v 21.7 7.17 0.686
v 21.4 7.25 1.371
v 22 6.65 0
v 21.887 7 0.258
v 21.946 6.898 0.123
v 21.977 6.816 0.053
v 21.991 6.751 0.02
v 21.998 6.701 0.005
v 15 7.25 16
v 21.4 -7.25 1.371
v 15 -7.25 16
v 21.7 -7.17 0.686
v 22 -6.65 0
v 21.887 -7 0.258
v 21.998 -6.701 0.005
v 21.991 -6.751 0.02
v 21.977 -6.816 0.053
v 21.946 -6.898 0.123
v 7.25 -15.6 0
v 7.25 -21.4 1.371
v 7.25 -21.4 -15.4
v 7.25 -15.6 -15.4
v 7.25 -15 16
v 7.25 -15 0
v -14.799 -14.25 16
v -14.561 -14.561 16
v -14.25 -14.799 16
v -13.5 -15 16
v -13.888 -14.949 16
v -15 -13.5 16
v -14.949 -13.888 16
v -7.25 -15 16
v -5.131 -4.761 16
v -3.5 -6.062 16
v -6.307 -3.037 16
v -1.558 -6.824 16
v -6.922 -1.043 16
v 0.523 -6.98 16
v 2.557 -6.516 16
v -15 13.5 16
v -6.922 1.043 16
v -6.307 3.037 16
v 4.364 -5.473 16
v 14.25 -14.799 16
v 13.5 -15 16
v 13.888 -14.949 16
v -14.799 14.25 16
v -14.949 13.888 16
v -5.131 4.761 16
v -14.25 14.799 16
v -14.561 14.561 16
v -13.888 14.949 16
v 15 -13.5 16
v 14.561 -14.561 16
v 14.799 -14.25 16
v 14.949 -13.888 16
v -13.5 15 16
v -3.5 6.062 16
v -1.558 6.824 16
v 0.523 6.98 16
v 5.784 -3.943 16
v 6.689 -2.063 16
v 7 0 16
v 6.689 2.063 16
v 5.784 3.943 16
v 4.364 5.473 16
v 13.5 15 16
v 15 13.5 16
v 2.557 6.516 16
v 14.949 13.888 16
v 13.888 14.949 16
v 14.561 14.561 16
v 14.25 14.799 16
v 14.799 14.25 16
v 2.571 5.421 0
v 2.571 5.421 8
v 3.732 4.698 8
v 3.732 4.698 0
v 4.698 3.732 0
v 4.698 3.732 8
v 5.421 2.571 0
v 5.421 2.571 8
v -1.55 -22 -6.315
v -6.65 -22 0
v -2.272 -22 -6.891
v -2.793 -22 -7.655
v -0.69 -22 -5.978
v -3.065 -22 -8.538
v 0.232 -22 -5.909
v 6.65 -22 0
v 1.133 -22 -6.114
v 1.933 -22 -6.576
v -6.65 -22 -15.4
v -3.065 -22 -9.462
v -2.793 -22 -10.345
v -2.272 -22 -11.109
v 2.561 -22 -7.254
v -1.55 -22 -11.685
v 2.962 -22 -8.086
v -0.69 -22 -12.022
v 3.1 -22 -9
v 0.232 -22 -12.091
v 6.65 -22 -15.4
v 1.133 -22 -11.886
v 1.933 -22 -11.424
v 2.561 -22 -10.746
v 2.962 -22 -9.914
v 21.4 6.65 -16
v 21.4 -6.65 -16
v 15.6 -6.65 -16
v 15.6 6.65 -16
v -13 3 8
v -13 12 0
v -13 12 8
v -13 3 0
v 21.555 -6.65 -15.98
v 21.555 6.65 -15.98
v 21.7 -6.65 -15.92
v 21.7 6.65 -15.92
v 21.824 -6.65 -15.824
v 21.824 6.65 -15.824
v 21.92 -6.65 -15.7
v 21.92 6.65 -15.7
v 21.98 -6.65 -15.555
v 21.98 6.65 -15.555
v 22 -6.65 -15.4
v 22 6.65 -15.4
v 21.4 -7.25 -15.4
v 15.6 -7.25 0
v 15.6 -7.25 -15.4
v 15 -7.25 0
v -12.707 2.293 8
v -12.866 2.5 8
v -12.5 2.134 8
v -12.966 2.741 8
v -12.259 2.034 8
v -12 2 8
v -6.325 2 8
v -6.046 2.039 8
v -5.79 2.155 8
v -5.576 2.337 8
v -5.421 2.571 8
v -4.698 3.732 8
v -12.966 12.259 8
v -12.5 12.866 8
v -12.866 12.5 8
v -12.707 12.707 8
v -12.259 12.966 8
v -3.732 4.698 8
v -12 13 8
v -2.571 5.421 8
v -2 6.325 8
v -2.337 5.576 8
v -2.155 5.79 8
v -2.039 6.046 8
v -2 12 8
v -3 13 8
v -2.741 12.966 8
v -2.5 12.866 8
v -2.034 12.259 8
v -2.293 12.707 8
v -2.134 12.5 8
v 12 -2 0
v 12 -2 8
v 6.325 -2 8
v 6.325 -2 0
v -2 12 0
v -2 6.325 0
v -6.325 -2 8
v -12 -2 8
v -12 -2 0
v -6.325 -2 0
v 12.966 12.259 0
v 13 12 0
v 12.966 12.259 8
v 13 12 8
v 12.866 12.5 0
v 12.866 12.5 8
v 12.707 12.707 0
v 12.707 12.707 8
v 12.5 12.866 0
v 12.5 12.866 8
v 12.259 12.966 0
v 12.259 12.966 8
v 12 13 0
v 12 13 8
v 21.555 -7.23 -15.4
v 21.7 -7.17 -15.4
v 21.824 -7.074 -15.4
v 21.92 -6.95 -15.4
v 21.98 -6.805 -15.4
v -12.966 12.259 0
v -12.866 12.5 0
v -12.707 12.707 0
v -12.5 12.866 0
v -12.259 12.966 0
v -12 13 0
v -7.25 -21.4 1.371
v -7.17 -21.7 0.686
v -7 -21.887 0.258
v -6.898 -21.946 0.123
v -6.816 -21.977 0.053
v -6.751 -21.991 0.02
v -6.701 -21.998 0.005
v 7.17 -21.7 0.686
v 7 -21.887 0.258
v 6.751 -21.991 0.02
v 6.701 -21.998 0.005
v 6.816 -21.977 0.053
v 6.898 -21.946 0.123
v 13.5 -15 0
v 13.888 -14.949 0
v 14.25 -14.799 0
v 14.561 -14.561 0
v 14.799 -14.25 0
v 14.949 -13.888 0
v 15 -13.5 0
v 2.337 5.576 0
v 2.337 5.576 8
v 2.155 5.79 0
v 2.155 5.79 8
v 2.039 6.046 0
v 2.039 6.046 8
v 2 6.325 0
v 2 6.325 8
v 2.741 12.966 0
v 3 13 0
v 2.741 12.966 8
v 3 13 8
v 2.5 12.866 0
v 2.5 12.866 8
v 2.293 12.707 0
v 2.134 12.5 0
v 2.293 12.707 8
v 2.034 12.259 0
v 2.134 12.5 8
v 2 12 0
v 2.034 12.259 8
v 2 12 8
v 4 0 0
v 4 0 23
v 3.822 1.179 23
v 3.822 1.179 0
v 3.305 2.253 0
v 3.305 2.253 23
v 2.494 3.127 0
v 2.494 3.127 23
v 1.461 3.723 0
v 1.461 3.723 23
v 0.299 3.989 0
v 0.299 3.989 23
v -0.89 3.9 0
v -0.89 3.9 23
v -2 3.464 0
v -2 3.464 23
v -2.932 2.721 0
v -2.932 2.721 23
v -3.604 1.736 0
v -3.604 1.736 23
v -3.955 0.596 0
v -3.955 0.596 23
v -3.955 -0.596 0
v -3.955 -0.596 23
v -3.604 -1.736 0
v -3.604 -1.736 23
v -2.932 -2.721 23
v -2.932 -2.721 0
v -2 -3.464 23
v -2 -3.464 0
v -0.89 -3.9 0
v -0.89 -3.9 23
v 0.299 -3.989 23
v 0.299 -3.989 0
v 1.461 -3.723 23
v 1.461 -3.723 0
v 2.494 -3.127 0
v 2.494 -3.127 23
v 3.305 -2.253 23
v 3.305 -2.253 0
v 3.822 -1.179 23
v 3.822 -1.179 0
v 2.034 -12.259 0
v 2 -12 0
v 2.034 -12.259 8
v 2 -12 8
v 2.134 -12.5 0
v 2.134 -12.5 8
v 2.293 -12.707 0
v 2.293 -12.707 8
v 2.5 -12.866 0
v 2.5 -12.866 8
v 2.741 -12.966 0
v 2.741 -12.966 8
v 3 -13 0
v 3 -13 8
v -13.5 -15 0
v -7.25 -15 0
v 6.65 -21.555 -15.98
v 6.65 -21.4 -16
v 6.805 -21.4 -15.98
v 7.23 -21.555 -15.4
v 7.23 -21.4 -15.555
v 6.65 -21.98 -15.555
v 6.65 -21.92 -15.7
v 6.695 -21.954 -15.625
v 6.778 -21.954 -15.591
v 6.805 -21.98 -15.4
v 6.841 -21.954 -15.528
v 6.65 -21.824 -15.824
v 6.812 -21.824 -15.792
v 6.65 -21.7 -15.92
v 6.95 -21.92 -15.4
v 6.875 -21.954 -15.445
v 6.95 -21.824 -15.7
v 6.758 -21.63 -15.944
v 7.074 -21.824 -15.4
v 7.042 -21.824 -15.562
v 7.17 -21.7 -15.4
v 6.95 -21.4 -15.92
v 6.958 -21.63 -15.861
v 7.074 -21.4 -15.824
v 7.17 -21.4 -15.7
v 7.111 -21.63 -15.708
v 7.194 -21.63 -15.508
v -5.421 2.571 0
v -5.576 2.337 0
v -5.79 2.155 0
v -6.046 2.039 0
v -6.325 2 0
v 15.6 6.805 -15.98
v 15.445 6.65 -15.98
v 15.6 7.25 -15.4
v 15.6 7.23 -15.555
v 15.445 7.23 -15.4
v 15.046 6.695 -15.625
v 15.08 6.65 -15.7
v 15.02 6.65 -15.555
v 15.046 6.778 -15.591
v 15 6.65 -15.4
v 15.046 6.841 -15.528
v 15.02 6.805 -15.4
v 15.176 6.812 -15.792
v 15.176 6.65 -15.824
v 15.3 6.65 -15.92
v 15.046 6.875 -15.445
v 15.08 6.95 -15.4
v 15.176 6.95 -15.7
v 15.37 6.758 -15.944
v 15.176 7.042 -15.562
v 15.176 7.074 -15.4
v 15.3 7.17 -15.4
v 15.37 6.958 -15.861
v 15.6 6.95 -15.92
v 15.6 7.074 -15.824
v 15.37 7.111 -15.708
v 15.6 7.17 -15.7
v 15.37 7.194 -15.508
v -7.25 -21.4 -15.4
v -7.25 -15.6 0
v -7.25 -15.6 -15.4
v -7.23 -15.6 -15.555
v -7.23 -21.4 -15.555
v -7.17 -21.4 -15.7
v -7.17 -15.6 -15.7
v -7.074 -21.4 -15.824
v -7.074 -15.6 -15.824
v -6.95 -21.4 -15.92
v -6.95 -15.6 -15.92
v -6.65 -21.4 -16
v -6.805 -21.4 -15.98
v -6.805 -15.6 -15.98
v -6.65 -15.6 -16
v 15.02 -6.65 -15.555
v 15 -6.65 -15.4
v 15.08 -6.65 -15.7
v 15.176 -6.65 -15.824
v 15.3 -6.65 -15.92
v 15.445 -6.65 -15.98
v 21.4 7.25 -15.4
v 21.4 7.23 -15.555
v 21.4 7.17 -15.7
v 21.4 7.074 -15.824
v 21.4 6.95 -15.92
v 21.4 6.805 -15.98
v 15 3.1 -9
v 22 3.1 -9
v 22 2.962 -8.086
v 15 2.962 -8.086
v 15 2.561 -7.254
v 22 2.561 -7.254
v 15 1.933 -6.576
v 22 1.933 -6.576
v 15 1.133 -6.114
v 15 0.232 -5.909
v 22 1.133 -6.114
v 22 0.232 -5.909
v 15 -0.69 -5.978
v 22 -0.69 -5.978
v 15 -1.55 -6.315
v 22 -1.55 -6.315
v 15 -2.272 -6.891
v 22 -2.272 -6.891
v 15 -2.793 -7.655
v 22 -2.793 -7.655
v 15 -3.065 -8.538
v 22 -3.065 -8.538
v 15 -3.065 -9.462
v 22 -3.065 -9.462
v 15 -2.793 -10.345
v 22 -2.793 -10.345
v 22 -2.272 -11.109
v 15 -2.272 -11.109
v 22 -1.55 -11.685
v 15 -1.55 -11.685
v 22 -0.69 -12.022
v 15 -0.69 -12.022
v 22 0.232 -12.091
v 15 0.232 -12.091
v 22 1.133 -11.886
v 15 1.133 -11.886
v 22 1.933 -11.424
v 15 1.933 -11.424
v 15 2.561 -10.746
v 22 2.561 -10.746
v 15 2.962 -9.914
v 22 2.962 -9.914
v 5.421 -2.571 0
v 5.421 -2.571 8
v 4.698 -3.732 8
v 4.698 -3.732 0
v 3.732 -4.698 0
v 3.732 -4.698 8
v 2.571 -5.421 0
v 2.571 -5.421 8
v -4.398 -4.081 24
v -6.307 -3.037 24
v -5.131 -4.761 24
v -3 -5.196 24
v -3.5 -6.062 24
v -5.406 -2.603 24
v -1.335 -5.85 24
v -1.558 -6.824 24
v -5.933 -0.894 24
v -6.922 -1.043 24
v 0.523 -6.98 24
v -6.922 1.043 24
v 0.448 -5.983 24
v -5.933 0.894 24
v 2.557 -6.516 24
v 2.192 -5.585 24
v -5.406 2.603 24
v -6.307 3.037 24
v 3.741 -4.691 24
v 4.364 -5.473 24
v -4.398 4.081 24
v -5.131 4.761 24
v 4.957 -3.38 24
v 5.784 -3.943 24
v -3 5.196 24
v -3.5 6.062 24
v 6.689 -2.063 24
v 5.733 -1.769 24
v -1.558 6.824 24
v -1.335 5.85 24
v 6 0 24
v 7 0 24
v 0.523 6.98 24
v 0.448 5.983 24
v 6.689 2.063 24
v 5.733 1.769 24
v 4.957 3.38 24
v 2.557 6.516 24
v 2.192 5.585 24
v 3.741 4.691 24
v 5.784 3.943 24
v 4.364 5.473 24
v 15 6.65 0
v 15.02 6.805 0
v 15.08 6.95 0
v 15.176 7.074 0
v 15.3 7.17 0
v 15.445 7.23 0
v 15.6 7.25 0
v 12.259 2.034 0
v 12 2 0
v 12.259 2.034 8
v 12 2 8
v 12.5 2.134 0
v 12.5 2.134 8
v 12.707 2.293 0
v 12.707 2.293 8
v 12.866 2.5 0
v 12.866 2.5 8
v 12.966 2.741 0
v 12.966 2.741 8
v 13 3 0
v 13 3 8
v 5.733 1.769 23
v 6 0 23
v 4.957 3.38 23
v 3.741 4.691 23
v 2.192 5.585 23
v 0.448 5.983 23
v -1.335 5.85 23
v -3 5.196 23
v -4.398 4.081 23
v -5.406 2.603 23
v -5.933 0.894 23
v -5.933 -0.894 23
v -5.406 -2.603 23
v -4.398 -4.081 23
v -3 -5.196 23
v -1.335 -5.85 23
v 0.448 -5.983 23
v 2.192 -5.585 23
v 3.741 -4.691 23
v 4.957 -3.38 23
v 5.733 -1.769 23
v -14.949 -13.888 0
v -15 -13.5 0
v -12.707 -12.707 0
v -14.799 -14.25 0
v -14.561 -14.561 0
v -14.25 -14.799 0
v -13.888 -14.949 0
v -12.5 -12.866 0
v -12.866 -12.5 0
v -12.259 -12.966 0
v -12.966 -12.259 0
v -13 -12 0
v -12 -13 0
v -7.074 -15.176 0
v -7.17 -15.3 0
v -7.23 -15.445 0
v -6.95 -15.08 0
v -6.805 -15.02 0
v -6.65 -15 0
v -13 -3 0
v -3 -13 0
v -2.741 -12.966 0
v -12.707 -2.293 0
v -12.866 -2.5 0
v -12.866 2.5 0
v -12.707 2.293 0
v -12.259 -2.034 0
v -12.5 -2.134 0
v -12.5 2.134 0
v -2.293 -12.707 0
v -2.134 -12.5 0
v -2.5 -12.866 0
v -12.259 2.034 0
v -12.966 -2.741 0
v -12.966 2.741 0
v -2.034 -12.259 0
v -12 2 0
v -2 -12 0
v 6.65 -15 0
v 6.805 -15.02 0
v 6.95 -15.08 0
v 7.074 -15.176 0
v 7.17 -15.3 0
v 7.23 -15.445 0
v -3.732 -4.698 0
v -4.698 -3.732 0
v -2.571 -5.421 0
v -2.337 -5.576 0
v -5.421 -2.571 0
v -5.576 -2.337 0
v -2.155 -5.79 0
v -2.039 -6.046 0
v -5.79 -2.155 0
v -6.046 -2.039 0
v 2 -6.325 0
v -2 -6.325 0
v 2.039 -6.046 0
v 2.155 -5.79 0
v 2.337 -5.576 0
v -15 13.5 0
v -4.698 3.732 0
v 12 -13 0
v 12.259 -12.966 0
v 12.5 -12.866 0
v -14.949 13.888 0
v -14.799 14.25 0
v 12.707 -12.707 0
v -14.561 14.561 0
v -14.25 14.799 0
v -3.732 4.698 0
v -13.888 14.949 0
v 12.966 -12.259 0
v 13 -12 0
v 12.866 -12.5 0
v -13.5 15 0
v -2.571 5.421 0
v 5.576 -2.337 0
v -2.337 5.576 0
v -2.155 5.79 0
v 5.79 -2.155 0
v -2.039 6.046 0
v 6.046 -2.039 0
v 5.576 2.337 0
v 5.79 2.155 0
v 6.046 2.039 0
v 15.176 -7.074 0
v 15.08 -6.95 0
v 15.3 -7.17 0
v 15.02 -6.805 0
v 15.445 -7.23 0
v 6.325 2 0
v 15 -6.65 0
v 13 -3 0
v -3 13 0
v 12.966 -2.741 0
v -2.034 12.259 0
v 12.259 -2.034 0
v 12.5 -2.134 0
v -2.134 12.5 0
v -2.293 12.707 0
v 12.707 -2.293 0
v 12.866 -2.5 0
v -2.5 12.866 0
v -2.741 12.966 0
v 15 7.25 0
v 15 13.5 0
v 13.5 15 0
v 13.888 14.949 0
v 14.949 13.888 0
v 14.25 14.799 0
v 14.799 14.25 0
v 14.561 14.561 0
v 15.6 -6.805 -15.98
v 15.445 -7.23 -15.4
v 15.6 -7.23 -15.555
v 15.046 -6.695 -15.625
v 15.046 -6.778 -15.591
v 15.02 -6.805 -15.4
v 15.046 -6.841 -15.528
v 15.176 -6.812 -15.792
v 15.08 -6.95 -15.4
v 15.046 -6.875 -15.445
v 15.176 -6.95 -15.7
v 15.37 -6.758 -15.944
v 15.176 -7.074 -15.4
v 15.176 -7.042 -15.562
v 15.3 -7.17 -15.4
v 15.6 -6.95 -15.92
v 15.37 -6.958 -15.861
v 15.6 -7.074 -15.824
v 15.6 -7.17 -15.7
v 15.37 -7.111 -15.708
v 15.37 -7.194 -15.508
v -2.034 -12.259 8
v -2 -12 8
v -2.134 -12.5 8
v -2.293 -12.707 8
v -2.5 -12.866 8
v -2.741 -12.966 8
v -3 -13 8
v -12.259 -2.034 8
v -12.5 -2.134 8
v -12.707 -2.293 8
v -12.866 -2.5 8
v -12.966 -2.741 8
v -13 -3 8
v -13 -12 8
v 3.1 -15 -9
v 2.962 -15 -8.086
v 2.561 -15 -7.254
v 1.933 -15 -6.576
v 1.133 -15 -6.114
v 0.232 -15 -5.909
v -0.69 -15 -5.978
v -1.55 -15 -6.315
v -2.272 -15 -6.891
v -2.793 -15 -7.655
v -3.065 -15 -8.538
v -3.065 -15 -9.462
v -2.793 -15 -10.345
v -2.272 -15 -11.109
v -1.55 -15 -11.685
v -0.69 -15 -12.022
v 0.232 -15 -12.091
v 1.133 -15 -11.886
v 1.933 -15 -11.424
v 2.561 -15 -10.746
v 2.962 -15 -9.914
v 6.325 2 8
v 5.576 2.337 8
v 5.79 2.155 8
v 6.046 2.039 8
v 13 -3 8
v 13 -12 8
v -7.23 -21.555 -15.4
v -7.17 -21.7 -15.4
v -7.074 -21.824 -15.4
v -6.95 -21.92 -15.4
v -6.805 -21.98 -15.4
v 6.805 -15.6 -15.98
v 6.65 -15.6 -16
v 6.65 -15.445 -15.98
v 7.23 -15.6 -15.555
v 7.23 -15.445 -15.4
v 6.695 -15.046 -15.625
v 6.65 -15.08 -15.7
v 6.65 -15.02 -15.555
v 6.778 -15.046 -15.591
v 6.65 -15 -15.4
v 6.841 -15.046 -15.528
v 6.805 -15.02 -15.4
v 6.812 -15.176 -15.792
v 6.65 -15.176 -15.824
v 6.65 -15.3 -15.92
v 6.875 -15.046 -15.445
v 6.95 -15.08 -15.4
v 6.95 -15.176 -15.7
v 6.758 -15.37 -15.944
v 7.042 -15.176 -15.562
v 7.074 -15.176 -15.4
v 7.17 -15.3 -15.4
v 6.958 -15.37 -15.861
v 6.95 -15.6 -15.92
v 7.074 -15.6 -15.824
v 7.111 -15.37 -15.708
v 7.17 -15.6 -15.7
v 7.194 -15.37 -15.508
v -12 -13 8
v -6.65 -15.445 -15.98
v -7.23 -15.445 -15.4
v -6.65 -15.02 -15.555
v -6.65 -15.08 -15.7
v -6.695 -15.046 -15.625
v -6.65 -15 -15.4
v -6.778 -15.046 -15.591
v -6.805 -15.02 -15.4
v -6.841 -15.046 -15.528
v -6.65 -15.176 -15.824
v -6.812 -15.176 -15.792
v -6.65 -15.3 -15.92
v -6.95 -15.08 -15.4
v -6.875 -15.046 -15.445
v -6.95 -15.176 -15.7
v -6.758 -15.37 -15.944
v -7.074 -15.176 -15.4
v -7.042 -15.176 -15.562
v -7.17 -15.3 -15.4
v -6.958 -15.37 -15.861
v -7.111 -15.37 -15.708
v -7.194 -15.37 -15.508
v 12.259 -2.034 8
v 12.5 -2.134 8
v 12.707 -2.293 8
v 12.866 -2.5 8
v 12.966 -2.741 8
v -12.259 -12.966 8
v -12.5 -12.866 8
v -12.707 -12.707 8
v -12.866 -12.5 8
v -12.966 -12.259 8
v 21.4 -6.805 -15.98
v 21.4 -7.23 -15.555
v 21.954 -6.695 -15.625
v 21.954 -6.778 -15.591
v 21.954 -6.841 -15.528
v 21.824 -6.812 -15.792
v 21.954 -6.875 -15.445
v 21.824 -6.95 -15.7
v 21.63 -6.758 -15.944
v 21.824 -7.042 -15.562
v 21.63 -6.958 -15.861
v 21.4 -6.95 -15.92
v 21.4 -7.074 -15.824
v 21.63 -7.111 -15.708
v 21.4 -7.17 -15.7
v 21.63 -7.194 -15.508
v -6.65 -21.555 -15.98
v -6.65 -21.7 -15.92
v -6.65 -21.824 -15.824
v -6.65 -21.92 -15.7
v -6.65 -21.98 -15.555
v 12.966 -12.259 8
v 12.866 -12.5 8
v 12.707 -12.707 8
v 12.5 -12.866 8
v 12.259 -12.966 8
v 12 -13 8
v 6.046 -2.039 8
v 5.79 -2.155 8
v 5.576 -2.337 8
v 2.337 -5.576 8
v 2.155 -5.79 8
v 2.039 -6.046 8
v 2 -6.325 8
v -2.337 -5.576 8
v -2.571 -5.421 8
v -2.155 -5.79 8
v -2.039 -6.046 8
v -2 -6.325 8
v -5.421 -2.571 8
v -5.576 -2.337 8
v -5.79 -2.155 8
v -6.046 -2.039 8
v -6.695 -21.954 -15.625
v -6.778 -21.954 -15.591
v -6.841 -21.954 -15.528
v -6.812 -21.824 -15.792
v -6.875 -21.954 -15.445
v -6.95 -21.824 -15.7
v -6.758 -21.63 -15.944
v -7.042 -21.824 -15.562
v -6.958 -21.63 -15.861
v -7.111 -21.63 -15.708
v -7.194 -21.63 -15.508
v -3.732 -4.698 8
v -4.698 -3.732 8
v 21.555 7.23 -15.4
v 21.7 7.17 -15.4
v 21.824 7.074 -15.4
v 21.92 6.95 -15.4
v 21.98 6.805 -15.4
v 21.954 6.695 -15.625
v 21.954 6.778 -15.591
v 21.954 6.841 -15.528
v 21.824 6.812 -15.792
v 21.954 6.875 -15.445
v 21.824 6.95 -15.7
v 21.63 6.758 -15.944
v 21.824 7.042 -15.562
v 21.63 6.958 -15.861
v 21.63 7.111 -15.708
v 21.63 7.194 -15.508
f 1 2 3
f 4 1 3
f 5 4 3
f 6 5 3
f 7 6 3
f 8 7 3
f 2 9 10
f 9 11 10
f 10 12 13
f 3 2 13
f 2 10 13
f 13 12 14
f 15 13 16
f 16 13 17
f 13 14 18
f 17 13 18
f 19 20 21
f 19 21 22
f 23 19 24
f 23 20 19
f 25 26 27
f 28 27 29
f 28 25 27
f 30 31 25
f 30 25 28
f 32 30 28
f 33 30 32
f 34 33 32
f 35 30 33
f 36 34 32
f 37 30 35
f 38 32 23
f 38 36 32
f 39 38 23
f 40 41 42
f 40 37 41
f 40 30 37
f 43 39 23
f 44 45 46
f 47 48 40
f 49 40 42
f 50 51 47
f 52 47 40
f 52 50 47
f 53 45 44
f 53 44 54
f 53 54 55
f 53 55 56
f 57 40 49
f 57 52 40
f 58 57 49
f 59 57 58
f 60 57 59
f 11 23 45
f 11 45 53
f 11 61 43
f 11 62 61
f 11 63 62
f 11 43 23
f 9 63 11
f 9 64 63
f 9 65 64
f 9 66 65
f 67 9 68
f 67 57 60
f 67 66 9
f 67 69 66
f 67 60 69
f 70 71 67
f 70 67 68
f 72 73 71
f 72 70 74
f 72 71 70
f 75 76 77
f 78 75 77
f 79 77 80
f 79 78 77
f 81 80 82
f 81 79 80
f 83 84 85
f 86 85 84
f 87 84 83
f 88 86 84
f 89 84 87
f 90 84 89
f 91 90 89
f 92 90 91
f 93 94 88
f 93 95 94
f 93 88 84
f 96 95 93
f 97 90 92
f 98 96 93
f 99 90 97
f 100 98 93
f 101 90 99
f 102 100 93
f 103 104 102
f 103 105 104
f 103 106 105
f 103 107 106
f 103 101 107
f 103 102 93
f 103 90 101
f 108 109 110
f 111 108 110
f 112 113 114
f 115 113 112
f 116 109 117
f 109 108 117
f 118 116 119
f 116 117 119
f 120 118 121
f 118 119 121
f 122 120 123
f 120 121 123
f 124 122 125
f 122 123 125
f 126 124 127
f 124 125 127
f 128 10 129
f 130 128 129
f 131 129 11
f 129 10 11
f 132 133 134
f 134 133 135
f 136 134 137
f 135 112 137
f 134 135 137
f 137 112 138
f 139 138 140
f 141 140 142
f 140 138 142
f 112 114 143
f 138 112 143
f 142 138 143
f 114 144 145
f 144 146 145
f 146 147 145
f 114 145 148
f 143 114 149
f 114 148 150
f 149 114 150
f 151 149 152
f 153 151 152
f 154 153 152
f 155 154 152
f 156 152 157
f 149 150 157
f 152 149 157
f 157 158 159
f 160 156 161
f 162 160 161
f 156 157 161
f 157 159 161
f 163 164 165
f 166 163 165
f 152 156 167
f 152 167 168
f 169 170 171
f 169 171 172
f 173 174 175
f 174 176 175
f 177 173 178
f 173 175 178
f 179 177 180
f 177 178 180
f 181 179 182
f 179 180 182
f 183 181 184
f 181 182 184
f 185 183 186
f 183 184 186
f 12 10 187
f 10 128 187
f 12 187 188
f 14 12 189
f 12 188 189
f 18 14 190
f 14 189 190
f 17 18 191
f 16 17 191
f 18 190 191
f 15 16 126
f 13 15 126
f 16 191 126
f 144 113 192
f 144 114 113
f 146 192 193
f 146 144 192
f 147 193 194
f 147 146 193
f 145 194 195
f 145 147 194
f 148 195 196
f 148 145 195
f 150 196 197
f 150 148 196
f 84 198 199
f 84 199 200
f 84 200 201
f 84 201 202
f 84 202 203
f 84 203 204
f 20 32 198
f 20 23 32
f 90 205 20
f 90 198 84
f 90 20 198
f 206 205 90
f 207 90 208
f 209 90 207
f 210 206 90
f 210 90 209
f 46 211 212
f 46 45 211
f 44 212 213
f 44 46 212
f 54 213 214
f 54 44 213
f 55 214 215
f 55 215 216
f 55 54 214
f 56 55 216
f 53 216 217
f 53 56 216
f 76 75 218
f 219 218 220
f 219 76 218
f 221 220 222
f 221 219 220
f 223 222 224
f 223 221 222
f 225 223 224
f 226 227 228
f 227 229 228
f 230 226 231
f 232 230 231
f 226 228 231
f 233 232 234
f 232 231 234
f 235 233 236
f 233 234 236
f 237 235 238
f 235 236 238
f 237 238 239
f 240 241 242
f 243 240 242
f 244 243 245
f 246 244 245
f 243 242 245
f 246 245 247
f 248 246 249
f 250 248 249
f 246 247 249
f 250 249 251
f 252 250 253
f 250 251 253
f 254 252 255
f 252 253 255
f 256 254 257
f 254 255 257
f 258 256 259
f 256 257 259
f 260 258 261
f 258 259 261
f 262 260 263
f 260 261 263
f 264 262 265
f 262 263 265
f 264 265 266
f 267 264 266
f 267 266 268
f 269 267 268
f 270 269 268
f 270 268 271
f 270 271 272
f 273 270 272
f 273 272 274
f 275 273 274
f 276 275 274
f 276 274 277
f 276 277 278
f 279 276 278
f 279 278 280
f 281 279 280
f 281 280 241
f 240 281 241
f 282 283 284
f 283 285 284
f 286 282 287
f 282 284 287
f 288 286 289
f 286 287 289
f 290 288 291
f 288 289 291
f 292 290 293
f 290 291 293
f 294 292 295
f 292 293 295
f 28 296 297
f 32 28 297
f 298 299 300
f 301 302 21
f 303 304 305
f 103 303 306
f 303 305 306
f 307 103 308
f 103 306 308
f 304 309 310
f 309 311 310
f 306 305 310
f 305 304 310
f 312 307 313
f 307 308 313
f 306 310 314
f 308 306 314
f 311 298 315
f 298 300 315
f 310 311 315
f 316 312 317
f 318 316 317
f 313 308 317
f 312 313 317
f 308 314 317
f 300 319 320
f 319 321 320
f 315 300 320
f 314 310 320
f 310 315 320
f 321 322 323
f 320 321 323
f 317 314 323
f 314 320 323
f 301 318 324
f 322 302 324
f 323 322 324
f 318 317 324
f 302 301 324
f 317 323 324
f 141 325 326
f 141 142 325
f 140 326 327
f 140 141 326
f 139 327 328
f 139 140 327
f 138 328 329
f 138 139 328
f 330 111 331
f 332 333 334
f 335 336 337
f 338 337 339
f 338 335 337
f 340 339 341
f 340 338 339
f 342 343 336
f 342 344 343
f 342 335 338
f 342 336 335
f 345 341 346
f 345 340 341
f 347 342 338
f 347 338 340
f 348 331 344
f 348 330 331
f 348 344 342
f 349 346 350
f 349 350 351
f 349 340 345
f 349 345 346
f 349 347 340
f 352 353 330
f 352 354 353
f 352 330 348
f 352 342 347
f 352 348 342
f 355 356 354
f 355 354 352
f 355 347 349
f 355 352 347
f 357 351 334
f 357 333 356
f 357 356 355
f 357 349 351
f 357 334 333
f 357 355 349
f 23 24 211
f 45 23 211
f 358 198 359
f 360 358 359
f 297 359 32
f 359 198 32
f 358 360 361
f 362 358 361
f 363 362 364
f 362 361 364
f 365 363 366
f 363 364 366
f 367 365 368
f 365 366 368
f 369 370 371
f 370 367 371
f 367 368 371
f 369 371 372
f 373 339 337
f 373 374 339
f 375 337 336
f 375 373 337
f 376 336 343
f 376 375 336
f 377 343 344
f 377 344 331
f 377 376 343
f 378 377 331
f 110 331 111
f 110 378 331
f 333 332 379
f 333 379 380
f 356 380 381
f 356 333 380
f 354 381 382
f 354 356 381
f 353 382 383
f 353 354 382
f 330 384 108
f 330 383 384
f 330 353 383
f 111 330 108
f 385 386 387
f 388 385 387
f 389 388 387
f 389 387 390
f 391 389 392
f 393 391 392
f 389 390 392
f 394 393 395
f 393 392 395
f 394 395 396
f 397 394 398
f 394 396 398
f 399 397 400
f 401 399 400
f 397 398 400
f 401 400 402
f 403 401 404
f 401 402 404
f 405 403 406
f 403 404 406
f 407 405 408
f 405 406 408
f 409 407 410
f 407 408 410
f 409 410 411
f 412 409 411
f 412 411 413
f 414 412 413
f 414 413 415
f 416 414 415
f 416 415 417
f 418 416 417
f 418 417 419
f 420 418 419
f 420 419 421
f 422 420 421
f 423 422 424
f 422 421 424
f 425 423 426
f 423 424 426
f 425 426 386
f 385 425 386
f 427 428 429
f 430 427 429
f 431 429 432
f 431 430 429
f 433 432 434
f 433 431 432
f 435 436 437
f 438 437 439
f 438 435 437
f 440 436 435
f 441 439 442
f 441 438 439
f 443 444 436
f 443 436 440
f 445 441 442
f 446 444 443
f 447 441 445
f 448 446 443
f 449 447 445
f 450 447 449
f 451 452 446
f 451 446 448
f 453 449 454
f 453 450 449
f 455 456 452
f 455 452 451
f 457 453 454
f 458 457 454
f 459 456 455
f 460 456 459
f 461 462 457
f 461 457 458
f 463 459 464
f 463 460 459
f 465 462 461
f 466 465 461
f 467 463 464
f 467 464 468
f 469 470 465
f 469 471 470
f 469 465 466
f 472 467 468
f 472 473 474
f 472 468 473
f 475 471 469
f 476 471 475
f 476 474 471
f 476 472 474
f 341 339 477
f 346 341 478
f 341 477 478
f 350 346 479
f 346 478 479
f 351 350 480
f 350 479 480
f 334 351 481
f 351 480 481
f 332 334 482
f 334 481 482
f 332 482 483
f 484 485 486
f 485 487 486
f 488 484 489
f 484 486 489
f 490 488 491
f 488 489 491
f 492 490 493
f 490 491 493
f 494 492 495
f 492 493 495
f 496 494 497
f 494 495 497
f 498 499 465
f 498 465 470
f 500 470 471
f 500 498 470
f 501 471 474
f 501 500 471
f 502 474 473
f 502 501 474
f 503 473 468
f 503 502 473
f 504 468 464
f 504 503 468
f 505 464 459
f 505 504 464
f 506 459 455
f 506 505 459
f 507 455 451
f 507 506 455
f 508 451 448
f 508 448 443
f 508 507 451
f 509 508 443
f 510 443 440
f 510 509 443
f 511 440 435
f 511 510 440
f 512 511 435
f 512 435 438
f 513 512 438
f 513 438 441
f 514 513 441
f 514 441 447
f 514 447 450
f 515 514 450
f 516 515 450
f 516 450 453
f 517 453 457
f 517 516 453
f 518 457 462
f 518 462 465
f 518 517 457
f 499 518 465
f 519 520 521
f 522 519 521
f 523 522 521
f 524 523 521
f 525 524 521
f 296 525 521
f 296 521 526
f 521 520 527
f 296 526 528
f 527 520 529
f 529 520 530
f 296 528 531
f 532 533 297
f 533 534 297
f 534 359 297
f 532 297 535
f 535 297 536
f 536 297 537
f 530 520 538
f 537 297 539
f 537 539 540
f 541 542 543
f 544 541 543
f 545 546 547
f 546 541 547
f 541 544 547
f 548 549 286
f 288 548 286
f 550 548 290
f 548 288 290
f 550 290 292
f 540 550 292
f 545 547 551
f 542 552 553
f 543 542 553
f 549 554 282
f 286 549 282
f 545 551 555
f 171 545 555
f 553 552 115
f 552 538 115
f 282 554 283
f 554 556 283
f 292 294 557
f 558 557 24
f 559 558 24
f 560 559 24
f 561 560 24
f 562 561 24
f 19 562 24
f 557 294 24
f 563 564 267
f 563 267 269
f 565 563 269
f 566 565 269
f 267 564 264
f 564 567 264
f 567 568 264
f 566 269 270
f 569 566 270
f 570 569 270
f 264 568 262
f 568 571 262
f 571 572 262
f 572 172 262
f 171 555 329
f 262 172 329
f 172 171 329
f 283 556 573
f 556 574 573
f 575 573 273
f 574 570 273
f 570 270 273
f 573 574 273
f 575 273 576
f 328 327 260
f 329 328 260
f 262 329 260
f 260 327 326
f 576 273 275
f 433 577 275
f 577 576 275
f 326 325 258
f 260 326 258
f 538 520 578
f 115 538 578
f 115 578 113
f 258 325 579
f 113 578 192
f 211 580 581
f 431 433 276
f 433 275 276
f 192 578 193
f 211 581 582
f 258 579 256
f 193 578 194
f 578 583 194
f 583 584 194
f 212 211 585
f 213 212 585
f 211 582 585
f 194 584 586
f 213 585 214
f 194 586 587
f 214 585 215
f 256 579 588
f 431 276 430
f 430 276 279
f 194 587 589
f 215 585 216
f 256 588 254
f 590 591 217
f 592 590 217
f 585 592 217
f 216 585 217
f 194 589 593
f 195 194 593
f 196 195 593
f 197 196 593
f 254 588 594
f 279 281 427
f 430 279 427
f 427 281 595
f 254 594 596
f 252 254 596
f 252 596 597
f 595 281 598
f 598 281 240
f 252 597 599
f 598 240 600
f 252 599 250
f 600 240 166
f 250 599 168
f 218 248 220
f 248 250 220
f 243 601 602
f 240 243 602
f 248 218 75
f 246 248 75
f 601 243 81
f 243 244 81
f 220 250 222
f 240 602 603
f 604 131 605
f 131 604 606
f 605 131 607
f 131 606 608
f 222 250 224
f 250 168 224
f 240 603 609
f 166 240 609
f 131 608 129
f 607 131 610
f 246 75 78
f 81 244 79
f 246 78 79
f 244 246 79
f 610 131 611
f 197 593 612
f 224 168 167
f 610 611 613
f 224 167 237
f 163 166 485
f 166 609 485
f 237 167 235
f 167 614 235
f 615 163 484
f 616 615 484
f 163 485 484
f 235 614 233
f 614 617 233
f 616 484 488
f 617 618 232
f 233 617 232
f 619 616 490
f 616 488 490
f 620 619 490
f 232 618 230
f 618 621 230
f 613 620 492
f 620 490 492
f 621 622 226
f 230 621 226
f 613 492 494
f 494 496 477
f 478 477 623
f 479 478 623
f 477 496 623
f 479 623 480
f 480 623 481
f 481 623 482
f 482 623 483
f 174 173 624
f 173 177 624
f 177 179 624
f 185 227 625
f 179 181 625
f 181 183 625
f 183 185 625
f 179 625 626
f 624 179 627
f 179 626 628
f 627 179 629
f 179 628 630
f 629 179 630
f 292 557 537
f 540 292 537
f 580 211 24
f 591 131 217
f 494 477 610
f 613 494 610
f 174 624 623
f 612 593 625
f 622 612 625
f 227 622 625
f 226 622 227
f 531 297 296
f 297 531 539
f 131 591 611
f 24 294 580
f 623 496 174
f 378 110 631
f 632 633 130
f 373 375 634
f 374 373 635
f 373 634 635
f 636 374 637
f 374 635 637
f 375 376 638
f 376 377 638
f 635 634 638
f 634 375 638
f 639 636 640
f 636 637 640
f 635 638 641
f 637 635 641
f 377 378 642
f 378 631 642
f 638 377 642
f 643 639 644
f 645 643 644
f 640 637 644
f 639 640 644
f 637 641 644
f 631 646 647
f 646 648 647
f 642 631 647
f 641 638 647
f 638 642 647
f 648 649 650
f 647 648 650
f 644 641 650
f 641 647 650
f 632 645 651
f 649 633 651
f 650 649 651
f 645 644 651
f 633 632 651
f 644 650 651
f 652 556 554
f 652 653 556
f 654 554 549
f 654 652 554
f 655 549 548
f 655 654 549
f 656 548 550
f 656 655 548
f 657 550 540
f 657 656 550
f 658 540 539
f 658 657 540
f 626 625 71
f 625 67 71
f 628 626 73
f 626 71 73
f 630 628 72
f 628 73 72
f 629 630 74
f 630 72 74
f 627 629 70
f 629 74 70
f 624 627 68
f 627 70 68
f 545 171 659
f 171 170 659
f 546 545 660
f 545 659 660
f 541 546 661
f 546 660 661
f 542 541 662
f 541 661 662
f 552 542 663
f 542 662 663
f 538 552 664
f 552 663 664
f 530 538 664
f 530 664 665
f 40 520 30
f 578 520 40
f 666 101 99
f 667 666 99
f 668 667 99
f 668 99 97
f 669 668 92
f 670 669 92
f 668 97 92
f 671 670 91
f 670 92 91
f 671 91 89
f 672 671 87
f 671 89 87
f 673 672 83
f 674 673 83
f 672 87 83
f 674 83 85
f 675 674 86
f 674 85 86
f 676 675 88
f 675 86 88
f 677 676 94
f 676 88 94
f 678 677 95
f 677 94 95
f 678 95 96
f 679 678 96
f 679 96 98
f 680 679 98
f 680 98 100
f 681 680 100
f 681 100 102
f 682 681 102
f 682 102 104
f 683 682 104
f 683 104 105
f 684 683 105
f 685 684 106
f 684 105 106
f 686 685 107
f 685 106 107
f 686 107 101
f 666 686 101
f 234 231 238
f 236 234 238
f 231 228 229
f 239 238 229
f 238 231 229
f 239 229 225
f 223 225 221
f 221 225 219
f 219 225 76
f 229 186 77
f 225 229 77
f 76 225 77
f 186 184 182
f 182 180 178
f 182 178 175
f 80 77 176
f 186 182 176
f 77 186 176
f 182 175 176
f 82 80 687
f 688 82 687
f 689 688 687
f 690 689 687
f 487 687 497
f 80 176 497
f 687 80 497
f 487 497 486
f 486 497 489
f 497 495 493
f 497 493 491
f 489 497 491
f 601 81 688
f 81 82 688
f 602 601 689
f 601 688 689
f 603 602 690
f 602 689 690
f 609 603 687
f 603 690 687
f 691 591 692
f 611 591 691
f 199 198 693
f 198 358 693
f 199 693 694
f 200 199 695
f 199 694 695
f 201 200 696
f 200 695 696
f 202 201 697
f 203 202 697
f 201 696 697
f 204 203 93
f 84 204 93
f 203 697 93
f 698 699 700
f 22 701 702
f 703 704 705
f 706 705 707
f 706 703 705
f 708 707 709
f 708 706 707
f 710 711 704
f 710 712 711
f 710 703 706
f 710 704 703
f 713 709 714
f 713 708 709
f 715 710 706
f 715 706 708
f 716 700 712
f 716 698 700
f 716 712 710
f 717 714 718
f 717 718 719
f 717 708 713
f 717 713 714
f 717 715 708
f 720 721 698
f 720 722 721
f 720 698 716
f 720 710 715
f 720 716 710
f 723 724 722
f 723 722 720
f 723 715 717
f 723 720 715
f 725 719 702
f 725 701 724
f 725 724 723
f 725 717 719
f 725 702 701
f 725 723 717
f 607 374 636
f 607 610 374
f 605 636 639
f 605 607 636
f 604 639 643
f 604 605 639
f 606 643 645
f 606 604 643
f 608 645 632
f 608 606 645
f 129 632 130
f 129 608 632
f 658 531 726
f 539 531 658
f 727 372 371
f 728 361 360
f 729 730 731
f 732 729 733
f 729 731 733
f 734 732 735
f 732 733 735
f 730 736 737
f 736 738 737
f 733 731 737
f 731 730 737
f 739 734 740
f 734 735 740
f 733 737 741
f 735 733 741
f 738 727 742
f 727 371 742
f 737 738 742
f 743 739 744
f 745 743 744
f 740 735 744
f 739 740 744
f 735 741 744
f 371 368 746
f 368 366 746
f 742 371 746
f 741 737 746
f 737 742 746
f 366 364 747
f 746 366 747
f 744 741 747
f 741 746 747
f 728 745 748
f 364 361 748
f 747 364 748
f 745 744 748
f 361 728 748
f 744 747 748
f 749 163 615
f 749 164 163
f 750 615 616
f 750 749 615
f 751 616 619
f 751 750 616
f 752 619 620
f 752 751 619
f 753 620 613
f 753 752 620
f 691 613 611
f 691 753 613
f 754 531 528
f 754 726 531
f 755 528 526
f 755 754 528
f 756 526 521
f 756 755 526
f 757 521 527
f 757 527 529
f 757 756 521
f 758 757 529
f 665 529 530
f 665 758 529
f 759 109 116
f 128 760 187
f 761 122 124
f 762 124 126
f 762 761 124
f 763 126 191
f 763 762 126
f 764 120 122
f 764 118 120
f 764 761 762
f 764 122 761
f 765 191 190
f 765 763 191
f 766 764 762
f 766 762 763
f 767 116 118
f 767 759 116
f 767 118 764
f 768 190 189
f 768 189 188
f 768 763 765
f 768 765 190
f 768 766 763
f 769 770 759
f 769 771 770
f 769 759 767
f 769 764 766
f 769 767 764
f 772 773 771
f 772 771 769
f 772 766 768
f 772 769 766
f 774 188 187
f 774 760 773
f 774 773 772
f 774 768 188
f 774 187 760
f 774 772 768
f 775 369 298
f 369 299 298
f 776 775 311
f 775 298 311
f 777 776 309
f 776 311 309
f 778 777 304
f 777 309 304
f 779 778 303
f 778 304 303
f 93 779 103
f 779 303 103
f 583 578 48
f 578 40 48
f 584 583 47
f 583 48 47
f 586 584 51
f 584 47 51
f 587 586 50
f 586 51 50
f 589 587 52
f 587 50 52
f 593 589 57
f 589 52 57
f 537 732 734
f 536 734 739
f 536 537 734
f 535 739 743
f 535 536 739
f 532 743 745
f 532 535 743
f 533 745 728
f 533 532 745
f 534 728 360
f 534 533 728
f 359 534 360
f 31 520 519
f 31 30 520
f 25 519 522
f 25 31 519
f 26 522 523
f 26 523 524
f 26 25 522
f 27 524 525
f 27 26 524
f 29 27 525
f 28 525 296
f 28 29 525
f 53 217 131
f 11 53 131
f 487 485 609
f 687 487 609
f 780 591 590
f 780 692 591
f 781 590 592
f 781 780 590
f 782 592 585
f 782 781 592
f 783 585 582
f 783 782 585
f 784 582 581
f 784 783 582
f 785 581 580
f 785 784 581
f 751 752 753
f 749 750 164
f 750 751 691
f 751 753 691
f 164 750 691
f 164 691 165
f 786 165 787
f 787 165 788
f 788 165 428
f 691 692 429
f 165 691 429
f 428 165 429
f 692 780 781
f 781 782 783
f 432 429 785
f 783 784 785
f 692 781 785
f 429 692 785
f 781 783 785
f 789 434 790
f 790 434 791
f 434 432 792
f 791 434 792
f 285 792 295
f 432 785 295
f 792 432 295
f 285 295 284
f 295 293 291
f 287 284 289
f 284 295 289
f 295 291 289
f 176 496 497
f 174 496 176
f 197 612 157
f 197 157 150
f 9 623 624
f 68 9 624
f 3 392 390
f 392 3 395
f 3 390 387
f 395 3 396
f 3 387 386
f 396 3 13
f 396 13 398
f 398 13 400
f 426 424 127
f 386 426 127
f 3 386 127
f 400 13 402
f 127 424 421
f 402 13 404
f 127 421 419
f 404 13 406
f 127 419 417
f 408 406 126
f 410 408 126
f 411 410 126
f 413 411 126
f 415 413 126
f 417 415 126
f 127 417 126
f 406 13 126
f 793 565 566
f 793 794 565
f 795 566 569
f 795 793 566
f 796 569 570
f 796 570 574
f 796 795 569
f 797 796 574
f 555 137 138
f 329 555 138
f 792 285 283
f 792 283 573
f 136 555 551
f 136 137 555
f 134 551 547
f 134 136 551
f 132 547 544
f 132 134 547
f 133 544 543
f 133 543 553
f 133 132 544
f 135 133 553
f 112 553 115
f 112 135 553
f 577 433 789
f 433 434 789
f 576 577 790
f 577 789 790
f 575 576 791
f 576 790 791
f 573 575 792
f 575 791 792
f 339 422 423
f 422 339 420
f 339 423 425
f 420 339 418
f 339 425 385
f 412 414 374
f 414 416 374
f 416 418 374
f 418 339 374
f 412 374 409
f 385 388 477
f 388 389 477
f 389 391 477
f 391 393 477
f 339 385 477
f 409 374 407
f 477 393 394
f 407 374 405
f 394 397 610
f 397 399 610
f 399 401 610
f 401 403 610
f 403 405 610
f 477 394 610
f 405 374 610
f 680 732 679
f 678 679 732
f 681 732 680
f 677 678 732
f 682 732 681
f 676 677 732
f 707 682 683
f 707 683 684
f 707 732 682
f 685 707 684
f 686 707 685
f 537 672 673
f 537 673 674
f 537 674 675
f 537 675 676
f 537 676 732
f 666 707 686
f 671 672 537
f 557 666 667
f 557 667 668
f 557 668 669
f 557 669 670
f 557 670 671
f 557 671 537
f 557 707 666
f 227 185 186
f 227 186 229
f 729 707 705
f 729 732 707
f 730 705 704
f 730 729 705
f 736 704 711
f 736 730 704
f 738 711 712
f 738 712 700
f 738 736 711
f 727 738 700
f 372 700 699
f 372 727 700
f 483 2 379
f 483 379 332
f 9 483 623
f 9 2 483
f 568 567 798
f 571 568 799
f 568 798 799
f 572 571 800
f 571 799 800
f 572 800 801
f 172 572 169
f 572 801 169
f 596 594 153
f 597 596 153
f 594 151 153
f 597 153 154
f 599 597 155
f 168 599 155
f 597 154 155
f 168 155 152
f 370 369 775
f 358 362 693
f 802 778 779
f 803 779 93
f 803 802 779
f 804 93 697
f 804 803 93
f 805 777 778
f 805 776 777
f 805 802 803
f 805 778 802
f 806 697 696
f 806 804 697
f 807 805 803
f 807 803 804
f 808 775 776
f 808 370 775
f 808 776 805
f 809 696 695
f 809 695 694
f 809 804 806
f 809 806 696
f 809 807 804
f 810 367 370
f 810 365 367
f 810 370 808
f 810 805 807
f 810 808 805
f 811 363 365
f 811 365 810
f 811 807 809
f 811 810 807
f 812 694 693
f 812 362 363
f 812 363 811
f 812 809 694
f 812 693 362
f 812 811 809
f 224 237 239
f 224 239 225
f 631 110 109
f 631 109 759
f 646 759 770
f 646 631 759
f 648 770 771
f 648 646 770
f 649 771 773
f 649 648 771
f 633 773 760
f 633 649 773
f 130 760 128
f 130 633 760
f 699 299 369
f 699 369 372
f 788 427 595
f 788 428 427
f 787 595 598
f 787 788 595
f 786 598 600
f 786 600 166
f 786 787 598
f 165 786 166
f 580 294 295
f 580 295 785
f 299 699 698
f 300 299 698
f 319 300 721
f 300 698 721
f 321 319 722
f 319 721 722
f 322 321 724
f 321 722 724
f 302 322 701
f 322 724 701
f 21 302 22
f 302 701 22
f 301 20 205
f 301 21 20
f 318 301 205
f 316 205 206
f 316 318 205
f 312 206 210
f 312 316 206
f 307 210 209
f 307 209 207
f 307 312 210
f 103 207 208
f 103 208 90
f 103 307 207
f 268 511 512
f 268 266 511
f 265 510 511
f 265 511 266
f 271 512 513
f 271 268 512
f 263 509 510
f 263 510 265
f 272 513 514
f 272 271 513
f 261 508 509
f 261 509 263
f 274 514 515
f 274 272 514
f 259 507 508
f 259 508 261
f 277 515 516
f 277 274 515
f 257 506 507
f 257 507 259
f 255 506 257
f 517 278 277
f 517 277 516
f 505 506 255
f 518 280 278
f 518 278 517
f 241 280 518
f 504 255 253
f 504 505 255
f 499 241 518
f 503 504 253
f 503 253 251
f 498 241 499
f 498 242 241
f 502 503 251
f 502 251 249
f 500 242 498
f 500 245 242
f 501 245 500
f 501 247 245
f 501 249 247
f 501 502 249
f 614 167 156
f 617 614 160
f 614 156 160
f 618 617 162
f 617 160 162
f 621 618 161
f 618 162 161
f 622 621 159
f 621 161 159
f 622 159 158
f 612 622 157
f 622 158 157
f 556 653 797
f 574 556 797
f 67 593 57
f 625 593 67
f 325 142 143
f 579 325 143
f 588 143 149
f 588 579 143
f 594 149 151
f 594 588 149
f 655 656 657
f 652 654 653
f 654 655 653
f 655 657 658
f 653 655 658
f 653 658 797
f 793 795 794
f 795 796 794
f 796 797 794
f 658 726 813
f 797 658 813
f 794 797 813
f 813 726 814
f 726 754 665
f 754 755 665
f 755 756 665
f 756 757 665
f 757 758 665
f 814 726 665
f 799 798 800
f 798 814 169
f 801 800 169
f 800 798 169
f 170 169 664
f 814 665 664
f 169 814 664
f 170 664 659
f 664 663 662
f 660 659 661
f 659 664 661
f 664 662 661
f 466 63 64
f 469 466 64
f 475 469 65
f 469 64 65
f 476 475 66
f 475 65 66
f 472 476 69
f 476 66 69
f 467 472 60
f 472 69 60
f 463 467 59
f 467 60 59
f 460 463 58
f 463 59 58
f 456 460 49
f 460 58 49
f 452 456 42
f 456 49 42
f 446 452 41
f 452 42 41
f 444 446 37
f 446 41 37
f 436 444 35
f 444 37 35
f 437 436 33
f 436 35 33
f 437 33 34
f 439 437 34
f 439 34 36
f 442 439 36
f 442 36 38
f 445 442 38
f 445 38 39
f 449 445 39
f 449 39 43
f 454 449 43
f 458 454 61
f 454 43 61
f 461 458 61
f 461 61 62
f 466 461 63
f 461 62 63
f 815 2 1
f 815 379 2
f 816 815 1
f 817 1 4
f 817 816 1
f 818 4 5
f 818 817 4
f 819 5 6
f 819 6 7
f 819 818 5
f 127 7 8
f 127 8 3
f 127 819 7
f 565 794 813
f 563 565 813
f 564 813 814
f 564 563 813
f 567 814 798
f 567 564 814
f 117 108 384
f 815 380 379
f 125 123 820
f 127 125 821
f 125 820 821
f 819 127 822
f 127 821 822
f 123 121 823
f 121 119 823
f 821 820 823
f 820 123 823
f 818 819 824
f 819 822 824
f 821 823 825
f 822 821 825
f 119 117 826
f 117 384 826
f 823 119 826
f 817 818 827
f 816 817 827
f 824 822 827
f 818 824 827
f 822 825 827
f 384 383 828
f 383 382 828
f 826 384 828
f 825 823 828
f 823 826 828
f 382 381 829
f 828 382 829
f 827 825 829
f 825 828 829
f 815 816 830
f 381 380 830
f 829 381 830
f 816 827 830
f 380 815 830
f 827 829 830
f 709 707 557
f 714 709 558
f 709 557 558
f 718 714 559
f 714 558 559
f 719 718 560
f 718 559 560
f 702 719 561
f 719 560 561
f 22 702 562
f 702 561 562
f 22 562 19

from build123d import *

# Parameters (mm, degrees)
SKETCH_W           = 30
SKETCH_H           = 30
PAD_DEPTH          = 16
SKETCH001_R        = 7
PAD001_DEPTH       = 8
SKETCH002_R        = 4
POCKET_DEPTH       = 24
CYLINDER_R         = 6
CYLINDER_DEPTH     = 1
PAD002_DEPTH       = 7.25
SKETCH004_R        = 3.1
POCKET001_DEPTH    = 7
PAD003_DEPTH       = 7.25
SKETCH006_R        = 3.1
POCKET002_DEPTH    = 7
POCKET003_DEPTH    = 8
POLARPATTERN_COUNT = 4
FILLET_R           = 1
FILLET001_R        = 1.5
FILLET002_R        = 0.6


with BuildPart() as part:
    # Sketch → Pad (new body)
    with BuildSketch(Plane.XY):
        Rectangle(SKETCH_W, SKETCH_H)
    extrude(amount=PAD_DEPTH)

    # Sketch001 (on Face6 of Pad) → Pad001 (join)
    with BuildSketch(Plane.XY.offset(16)):
        Circle(SKETCH001_R)
    extrude(amount=PAD001_DEPTH)

    # Sketch002 (on Face8 of Pad001) → Pocket (cut)
    with BuildSketch(Plane.XY.offset(24)):
        Circle(SKETCH002_R)
    extrude(amount=-POCKET_DEPTH, mode=Mode.SUBTRACT)

    # Cylinder → Cylinder (cut)
    with BuildSketch(Plane.XY.offset(23)):
        Circle(CYLINDER_R)
    extrude(amount=CYLINDER_DEPTH, mode=Mode.SUBTRACT)

    # Sketch003 → Pad002 (join, symmetric)
    with BuildSketch(Plane.XZ):
        Polygon((15, 16), (22, 0), (22, -16), (15, -16), align=None)
    extrude(amount=PAD002_DEPTH, both=True)

    # Sketch004 (on Face16 of Pad002) → Pocket001 (cut)
    with BuildSketch(Plane(origin=(22, 0, 23), x_dir=(0, 1, 0), z_dir=(1, 0, 0))):
        with Locations((0, -32)):
            Circle(SKETCH004_R)
    extrude(amount=-POCKET001_DEPTH, mode=Mode.SUBTRACT)

    # Sketch005 → Pad003 (join, symmetric)
    with BuildSketch(Plane.YZ):
        Polygon((-15, 16), (-22, 0), (-22, -16), (-15, -16), align=None)
    extrude(amount=PAD003_DEPTH, both=True)

    # Sketch006 (on Face17 of Pad003) → Pocket002 (cut)
    with BuildSketch(Plane(origin=(0, -22, 23), x_dir=(1, 0, 0), z_dir=(0, -1, 0))):
        with Locations((0, -32)):
            Circle(SKETCH006_R)
    extrude(amount=-POCKET002_DEPTH, mode=Mode.SUBTRACT)

    # Sketch007 (on Face4 of Pocket002) → Pocket003 (cut)
    with BuildSketch(Plane(origin=(0, 0, 0), x_dir=(1, 0, 0), z_dir=(0, 0, -1))):
        with BuildLine():
            ThreePointArc((5.656854, 2), (4.242641, 4.242641), (2, 5.656854))
            Line((2, 13), (2, 5.656854))
            Line((2, 13), (13, 13))
            Line((13, 13), (13, 2))
            Line((13, 2), (5.656854, 2))
        make_face()
    pocket003 = extrude(amount=-POCKET003_DEPTH, mode=Mode.SUBTRACT)

    # PolarPattern: Pocket003 ×4 about axis
    polarpattern_axis = Axis((0, 0, 0), (0, 0, -1))
    for i in range(1, POLARPATTERN_COUNT):
        add(pocket003.rotate(polarpattern_axis, i * 360 / POLARPATTERN_COUNT), mode=Mode.SUBTRACT)

    # Fillet
    fillet_edges = [part.edges().sort_by_distance(p)[0] for p in [
        (5.656854, -2, 4),
        (2, -5.656854, 4),
        (2, -13, 4),
        (13, -13, 4),
        (13, -2, 4),
        (5.656854, 2, 4),
        (13, 2, 4),
        (13, 13, 4),
        (2, 13, 4),
        (2, 5.656854, 4),
        (-2, 5.656854, 4),
        (-13, 2, 4),
        (-13, 13, 4),
        (-2, 13, 4),
        (-5.656854, 2, 4),
        (-5.656854, -2, 4),
        (-2, -5.656854, 4),
        (-2, -13, 4),
        (-13, -13, 4),
        (-13, -2, 4),
    ]]
    fillet(fillet_edges, radius=FILLET_R)

    # Fillet001
    fillet001_edges = [part.edges().sort_by_distance(p)[0] for p in [
        (15, 15, 8),
        (-15, 15, 8),
        (-15, -15, 8),
        (15, -15, 8),
    ]]
    fillet(fillet001_edges, radius=FILLET001_R)

    # Fillet002
    fillet002_edges = [part.edges().sort_by_distance(p)[0] for p in [
        (18.5, -7.25, -16),
        (18.5, 7.25, -16),
        (7.25, -18.5, -16),
        (-7.25, -18.5, -16),
        (0, -22, -16),
        (0, -15, -16),
        (22, 0, -16),
        (15, 0, -16),
        (22, -7.25, -8),
        (15, -7.25, -8),
        (22, 7.25, -8),
        (15, 7.25, -8),
        (7.25, -15, -8),
        (7.25, -22, -8),
        (-7.25, -15, -8),
        (-7.25, -22, -8),
    ]]
    fillet(fillet002_edges, radius=FILLET002_R)


solid = part.part
